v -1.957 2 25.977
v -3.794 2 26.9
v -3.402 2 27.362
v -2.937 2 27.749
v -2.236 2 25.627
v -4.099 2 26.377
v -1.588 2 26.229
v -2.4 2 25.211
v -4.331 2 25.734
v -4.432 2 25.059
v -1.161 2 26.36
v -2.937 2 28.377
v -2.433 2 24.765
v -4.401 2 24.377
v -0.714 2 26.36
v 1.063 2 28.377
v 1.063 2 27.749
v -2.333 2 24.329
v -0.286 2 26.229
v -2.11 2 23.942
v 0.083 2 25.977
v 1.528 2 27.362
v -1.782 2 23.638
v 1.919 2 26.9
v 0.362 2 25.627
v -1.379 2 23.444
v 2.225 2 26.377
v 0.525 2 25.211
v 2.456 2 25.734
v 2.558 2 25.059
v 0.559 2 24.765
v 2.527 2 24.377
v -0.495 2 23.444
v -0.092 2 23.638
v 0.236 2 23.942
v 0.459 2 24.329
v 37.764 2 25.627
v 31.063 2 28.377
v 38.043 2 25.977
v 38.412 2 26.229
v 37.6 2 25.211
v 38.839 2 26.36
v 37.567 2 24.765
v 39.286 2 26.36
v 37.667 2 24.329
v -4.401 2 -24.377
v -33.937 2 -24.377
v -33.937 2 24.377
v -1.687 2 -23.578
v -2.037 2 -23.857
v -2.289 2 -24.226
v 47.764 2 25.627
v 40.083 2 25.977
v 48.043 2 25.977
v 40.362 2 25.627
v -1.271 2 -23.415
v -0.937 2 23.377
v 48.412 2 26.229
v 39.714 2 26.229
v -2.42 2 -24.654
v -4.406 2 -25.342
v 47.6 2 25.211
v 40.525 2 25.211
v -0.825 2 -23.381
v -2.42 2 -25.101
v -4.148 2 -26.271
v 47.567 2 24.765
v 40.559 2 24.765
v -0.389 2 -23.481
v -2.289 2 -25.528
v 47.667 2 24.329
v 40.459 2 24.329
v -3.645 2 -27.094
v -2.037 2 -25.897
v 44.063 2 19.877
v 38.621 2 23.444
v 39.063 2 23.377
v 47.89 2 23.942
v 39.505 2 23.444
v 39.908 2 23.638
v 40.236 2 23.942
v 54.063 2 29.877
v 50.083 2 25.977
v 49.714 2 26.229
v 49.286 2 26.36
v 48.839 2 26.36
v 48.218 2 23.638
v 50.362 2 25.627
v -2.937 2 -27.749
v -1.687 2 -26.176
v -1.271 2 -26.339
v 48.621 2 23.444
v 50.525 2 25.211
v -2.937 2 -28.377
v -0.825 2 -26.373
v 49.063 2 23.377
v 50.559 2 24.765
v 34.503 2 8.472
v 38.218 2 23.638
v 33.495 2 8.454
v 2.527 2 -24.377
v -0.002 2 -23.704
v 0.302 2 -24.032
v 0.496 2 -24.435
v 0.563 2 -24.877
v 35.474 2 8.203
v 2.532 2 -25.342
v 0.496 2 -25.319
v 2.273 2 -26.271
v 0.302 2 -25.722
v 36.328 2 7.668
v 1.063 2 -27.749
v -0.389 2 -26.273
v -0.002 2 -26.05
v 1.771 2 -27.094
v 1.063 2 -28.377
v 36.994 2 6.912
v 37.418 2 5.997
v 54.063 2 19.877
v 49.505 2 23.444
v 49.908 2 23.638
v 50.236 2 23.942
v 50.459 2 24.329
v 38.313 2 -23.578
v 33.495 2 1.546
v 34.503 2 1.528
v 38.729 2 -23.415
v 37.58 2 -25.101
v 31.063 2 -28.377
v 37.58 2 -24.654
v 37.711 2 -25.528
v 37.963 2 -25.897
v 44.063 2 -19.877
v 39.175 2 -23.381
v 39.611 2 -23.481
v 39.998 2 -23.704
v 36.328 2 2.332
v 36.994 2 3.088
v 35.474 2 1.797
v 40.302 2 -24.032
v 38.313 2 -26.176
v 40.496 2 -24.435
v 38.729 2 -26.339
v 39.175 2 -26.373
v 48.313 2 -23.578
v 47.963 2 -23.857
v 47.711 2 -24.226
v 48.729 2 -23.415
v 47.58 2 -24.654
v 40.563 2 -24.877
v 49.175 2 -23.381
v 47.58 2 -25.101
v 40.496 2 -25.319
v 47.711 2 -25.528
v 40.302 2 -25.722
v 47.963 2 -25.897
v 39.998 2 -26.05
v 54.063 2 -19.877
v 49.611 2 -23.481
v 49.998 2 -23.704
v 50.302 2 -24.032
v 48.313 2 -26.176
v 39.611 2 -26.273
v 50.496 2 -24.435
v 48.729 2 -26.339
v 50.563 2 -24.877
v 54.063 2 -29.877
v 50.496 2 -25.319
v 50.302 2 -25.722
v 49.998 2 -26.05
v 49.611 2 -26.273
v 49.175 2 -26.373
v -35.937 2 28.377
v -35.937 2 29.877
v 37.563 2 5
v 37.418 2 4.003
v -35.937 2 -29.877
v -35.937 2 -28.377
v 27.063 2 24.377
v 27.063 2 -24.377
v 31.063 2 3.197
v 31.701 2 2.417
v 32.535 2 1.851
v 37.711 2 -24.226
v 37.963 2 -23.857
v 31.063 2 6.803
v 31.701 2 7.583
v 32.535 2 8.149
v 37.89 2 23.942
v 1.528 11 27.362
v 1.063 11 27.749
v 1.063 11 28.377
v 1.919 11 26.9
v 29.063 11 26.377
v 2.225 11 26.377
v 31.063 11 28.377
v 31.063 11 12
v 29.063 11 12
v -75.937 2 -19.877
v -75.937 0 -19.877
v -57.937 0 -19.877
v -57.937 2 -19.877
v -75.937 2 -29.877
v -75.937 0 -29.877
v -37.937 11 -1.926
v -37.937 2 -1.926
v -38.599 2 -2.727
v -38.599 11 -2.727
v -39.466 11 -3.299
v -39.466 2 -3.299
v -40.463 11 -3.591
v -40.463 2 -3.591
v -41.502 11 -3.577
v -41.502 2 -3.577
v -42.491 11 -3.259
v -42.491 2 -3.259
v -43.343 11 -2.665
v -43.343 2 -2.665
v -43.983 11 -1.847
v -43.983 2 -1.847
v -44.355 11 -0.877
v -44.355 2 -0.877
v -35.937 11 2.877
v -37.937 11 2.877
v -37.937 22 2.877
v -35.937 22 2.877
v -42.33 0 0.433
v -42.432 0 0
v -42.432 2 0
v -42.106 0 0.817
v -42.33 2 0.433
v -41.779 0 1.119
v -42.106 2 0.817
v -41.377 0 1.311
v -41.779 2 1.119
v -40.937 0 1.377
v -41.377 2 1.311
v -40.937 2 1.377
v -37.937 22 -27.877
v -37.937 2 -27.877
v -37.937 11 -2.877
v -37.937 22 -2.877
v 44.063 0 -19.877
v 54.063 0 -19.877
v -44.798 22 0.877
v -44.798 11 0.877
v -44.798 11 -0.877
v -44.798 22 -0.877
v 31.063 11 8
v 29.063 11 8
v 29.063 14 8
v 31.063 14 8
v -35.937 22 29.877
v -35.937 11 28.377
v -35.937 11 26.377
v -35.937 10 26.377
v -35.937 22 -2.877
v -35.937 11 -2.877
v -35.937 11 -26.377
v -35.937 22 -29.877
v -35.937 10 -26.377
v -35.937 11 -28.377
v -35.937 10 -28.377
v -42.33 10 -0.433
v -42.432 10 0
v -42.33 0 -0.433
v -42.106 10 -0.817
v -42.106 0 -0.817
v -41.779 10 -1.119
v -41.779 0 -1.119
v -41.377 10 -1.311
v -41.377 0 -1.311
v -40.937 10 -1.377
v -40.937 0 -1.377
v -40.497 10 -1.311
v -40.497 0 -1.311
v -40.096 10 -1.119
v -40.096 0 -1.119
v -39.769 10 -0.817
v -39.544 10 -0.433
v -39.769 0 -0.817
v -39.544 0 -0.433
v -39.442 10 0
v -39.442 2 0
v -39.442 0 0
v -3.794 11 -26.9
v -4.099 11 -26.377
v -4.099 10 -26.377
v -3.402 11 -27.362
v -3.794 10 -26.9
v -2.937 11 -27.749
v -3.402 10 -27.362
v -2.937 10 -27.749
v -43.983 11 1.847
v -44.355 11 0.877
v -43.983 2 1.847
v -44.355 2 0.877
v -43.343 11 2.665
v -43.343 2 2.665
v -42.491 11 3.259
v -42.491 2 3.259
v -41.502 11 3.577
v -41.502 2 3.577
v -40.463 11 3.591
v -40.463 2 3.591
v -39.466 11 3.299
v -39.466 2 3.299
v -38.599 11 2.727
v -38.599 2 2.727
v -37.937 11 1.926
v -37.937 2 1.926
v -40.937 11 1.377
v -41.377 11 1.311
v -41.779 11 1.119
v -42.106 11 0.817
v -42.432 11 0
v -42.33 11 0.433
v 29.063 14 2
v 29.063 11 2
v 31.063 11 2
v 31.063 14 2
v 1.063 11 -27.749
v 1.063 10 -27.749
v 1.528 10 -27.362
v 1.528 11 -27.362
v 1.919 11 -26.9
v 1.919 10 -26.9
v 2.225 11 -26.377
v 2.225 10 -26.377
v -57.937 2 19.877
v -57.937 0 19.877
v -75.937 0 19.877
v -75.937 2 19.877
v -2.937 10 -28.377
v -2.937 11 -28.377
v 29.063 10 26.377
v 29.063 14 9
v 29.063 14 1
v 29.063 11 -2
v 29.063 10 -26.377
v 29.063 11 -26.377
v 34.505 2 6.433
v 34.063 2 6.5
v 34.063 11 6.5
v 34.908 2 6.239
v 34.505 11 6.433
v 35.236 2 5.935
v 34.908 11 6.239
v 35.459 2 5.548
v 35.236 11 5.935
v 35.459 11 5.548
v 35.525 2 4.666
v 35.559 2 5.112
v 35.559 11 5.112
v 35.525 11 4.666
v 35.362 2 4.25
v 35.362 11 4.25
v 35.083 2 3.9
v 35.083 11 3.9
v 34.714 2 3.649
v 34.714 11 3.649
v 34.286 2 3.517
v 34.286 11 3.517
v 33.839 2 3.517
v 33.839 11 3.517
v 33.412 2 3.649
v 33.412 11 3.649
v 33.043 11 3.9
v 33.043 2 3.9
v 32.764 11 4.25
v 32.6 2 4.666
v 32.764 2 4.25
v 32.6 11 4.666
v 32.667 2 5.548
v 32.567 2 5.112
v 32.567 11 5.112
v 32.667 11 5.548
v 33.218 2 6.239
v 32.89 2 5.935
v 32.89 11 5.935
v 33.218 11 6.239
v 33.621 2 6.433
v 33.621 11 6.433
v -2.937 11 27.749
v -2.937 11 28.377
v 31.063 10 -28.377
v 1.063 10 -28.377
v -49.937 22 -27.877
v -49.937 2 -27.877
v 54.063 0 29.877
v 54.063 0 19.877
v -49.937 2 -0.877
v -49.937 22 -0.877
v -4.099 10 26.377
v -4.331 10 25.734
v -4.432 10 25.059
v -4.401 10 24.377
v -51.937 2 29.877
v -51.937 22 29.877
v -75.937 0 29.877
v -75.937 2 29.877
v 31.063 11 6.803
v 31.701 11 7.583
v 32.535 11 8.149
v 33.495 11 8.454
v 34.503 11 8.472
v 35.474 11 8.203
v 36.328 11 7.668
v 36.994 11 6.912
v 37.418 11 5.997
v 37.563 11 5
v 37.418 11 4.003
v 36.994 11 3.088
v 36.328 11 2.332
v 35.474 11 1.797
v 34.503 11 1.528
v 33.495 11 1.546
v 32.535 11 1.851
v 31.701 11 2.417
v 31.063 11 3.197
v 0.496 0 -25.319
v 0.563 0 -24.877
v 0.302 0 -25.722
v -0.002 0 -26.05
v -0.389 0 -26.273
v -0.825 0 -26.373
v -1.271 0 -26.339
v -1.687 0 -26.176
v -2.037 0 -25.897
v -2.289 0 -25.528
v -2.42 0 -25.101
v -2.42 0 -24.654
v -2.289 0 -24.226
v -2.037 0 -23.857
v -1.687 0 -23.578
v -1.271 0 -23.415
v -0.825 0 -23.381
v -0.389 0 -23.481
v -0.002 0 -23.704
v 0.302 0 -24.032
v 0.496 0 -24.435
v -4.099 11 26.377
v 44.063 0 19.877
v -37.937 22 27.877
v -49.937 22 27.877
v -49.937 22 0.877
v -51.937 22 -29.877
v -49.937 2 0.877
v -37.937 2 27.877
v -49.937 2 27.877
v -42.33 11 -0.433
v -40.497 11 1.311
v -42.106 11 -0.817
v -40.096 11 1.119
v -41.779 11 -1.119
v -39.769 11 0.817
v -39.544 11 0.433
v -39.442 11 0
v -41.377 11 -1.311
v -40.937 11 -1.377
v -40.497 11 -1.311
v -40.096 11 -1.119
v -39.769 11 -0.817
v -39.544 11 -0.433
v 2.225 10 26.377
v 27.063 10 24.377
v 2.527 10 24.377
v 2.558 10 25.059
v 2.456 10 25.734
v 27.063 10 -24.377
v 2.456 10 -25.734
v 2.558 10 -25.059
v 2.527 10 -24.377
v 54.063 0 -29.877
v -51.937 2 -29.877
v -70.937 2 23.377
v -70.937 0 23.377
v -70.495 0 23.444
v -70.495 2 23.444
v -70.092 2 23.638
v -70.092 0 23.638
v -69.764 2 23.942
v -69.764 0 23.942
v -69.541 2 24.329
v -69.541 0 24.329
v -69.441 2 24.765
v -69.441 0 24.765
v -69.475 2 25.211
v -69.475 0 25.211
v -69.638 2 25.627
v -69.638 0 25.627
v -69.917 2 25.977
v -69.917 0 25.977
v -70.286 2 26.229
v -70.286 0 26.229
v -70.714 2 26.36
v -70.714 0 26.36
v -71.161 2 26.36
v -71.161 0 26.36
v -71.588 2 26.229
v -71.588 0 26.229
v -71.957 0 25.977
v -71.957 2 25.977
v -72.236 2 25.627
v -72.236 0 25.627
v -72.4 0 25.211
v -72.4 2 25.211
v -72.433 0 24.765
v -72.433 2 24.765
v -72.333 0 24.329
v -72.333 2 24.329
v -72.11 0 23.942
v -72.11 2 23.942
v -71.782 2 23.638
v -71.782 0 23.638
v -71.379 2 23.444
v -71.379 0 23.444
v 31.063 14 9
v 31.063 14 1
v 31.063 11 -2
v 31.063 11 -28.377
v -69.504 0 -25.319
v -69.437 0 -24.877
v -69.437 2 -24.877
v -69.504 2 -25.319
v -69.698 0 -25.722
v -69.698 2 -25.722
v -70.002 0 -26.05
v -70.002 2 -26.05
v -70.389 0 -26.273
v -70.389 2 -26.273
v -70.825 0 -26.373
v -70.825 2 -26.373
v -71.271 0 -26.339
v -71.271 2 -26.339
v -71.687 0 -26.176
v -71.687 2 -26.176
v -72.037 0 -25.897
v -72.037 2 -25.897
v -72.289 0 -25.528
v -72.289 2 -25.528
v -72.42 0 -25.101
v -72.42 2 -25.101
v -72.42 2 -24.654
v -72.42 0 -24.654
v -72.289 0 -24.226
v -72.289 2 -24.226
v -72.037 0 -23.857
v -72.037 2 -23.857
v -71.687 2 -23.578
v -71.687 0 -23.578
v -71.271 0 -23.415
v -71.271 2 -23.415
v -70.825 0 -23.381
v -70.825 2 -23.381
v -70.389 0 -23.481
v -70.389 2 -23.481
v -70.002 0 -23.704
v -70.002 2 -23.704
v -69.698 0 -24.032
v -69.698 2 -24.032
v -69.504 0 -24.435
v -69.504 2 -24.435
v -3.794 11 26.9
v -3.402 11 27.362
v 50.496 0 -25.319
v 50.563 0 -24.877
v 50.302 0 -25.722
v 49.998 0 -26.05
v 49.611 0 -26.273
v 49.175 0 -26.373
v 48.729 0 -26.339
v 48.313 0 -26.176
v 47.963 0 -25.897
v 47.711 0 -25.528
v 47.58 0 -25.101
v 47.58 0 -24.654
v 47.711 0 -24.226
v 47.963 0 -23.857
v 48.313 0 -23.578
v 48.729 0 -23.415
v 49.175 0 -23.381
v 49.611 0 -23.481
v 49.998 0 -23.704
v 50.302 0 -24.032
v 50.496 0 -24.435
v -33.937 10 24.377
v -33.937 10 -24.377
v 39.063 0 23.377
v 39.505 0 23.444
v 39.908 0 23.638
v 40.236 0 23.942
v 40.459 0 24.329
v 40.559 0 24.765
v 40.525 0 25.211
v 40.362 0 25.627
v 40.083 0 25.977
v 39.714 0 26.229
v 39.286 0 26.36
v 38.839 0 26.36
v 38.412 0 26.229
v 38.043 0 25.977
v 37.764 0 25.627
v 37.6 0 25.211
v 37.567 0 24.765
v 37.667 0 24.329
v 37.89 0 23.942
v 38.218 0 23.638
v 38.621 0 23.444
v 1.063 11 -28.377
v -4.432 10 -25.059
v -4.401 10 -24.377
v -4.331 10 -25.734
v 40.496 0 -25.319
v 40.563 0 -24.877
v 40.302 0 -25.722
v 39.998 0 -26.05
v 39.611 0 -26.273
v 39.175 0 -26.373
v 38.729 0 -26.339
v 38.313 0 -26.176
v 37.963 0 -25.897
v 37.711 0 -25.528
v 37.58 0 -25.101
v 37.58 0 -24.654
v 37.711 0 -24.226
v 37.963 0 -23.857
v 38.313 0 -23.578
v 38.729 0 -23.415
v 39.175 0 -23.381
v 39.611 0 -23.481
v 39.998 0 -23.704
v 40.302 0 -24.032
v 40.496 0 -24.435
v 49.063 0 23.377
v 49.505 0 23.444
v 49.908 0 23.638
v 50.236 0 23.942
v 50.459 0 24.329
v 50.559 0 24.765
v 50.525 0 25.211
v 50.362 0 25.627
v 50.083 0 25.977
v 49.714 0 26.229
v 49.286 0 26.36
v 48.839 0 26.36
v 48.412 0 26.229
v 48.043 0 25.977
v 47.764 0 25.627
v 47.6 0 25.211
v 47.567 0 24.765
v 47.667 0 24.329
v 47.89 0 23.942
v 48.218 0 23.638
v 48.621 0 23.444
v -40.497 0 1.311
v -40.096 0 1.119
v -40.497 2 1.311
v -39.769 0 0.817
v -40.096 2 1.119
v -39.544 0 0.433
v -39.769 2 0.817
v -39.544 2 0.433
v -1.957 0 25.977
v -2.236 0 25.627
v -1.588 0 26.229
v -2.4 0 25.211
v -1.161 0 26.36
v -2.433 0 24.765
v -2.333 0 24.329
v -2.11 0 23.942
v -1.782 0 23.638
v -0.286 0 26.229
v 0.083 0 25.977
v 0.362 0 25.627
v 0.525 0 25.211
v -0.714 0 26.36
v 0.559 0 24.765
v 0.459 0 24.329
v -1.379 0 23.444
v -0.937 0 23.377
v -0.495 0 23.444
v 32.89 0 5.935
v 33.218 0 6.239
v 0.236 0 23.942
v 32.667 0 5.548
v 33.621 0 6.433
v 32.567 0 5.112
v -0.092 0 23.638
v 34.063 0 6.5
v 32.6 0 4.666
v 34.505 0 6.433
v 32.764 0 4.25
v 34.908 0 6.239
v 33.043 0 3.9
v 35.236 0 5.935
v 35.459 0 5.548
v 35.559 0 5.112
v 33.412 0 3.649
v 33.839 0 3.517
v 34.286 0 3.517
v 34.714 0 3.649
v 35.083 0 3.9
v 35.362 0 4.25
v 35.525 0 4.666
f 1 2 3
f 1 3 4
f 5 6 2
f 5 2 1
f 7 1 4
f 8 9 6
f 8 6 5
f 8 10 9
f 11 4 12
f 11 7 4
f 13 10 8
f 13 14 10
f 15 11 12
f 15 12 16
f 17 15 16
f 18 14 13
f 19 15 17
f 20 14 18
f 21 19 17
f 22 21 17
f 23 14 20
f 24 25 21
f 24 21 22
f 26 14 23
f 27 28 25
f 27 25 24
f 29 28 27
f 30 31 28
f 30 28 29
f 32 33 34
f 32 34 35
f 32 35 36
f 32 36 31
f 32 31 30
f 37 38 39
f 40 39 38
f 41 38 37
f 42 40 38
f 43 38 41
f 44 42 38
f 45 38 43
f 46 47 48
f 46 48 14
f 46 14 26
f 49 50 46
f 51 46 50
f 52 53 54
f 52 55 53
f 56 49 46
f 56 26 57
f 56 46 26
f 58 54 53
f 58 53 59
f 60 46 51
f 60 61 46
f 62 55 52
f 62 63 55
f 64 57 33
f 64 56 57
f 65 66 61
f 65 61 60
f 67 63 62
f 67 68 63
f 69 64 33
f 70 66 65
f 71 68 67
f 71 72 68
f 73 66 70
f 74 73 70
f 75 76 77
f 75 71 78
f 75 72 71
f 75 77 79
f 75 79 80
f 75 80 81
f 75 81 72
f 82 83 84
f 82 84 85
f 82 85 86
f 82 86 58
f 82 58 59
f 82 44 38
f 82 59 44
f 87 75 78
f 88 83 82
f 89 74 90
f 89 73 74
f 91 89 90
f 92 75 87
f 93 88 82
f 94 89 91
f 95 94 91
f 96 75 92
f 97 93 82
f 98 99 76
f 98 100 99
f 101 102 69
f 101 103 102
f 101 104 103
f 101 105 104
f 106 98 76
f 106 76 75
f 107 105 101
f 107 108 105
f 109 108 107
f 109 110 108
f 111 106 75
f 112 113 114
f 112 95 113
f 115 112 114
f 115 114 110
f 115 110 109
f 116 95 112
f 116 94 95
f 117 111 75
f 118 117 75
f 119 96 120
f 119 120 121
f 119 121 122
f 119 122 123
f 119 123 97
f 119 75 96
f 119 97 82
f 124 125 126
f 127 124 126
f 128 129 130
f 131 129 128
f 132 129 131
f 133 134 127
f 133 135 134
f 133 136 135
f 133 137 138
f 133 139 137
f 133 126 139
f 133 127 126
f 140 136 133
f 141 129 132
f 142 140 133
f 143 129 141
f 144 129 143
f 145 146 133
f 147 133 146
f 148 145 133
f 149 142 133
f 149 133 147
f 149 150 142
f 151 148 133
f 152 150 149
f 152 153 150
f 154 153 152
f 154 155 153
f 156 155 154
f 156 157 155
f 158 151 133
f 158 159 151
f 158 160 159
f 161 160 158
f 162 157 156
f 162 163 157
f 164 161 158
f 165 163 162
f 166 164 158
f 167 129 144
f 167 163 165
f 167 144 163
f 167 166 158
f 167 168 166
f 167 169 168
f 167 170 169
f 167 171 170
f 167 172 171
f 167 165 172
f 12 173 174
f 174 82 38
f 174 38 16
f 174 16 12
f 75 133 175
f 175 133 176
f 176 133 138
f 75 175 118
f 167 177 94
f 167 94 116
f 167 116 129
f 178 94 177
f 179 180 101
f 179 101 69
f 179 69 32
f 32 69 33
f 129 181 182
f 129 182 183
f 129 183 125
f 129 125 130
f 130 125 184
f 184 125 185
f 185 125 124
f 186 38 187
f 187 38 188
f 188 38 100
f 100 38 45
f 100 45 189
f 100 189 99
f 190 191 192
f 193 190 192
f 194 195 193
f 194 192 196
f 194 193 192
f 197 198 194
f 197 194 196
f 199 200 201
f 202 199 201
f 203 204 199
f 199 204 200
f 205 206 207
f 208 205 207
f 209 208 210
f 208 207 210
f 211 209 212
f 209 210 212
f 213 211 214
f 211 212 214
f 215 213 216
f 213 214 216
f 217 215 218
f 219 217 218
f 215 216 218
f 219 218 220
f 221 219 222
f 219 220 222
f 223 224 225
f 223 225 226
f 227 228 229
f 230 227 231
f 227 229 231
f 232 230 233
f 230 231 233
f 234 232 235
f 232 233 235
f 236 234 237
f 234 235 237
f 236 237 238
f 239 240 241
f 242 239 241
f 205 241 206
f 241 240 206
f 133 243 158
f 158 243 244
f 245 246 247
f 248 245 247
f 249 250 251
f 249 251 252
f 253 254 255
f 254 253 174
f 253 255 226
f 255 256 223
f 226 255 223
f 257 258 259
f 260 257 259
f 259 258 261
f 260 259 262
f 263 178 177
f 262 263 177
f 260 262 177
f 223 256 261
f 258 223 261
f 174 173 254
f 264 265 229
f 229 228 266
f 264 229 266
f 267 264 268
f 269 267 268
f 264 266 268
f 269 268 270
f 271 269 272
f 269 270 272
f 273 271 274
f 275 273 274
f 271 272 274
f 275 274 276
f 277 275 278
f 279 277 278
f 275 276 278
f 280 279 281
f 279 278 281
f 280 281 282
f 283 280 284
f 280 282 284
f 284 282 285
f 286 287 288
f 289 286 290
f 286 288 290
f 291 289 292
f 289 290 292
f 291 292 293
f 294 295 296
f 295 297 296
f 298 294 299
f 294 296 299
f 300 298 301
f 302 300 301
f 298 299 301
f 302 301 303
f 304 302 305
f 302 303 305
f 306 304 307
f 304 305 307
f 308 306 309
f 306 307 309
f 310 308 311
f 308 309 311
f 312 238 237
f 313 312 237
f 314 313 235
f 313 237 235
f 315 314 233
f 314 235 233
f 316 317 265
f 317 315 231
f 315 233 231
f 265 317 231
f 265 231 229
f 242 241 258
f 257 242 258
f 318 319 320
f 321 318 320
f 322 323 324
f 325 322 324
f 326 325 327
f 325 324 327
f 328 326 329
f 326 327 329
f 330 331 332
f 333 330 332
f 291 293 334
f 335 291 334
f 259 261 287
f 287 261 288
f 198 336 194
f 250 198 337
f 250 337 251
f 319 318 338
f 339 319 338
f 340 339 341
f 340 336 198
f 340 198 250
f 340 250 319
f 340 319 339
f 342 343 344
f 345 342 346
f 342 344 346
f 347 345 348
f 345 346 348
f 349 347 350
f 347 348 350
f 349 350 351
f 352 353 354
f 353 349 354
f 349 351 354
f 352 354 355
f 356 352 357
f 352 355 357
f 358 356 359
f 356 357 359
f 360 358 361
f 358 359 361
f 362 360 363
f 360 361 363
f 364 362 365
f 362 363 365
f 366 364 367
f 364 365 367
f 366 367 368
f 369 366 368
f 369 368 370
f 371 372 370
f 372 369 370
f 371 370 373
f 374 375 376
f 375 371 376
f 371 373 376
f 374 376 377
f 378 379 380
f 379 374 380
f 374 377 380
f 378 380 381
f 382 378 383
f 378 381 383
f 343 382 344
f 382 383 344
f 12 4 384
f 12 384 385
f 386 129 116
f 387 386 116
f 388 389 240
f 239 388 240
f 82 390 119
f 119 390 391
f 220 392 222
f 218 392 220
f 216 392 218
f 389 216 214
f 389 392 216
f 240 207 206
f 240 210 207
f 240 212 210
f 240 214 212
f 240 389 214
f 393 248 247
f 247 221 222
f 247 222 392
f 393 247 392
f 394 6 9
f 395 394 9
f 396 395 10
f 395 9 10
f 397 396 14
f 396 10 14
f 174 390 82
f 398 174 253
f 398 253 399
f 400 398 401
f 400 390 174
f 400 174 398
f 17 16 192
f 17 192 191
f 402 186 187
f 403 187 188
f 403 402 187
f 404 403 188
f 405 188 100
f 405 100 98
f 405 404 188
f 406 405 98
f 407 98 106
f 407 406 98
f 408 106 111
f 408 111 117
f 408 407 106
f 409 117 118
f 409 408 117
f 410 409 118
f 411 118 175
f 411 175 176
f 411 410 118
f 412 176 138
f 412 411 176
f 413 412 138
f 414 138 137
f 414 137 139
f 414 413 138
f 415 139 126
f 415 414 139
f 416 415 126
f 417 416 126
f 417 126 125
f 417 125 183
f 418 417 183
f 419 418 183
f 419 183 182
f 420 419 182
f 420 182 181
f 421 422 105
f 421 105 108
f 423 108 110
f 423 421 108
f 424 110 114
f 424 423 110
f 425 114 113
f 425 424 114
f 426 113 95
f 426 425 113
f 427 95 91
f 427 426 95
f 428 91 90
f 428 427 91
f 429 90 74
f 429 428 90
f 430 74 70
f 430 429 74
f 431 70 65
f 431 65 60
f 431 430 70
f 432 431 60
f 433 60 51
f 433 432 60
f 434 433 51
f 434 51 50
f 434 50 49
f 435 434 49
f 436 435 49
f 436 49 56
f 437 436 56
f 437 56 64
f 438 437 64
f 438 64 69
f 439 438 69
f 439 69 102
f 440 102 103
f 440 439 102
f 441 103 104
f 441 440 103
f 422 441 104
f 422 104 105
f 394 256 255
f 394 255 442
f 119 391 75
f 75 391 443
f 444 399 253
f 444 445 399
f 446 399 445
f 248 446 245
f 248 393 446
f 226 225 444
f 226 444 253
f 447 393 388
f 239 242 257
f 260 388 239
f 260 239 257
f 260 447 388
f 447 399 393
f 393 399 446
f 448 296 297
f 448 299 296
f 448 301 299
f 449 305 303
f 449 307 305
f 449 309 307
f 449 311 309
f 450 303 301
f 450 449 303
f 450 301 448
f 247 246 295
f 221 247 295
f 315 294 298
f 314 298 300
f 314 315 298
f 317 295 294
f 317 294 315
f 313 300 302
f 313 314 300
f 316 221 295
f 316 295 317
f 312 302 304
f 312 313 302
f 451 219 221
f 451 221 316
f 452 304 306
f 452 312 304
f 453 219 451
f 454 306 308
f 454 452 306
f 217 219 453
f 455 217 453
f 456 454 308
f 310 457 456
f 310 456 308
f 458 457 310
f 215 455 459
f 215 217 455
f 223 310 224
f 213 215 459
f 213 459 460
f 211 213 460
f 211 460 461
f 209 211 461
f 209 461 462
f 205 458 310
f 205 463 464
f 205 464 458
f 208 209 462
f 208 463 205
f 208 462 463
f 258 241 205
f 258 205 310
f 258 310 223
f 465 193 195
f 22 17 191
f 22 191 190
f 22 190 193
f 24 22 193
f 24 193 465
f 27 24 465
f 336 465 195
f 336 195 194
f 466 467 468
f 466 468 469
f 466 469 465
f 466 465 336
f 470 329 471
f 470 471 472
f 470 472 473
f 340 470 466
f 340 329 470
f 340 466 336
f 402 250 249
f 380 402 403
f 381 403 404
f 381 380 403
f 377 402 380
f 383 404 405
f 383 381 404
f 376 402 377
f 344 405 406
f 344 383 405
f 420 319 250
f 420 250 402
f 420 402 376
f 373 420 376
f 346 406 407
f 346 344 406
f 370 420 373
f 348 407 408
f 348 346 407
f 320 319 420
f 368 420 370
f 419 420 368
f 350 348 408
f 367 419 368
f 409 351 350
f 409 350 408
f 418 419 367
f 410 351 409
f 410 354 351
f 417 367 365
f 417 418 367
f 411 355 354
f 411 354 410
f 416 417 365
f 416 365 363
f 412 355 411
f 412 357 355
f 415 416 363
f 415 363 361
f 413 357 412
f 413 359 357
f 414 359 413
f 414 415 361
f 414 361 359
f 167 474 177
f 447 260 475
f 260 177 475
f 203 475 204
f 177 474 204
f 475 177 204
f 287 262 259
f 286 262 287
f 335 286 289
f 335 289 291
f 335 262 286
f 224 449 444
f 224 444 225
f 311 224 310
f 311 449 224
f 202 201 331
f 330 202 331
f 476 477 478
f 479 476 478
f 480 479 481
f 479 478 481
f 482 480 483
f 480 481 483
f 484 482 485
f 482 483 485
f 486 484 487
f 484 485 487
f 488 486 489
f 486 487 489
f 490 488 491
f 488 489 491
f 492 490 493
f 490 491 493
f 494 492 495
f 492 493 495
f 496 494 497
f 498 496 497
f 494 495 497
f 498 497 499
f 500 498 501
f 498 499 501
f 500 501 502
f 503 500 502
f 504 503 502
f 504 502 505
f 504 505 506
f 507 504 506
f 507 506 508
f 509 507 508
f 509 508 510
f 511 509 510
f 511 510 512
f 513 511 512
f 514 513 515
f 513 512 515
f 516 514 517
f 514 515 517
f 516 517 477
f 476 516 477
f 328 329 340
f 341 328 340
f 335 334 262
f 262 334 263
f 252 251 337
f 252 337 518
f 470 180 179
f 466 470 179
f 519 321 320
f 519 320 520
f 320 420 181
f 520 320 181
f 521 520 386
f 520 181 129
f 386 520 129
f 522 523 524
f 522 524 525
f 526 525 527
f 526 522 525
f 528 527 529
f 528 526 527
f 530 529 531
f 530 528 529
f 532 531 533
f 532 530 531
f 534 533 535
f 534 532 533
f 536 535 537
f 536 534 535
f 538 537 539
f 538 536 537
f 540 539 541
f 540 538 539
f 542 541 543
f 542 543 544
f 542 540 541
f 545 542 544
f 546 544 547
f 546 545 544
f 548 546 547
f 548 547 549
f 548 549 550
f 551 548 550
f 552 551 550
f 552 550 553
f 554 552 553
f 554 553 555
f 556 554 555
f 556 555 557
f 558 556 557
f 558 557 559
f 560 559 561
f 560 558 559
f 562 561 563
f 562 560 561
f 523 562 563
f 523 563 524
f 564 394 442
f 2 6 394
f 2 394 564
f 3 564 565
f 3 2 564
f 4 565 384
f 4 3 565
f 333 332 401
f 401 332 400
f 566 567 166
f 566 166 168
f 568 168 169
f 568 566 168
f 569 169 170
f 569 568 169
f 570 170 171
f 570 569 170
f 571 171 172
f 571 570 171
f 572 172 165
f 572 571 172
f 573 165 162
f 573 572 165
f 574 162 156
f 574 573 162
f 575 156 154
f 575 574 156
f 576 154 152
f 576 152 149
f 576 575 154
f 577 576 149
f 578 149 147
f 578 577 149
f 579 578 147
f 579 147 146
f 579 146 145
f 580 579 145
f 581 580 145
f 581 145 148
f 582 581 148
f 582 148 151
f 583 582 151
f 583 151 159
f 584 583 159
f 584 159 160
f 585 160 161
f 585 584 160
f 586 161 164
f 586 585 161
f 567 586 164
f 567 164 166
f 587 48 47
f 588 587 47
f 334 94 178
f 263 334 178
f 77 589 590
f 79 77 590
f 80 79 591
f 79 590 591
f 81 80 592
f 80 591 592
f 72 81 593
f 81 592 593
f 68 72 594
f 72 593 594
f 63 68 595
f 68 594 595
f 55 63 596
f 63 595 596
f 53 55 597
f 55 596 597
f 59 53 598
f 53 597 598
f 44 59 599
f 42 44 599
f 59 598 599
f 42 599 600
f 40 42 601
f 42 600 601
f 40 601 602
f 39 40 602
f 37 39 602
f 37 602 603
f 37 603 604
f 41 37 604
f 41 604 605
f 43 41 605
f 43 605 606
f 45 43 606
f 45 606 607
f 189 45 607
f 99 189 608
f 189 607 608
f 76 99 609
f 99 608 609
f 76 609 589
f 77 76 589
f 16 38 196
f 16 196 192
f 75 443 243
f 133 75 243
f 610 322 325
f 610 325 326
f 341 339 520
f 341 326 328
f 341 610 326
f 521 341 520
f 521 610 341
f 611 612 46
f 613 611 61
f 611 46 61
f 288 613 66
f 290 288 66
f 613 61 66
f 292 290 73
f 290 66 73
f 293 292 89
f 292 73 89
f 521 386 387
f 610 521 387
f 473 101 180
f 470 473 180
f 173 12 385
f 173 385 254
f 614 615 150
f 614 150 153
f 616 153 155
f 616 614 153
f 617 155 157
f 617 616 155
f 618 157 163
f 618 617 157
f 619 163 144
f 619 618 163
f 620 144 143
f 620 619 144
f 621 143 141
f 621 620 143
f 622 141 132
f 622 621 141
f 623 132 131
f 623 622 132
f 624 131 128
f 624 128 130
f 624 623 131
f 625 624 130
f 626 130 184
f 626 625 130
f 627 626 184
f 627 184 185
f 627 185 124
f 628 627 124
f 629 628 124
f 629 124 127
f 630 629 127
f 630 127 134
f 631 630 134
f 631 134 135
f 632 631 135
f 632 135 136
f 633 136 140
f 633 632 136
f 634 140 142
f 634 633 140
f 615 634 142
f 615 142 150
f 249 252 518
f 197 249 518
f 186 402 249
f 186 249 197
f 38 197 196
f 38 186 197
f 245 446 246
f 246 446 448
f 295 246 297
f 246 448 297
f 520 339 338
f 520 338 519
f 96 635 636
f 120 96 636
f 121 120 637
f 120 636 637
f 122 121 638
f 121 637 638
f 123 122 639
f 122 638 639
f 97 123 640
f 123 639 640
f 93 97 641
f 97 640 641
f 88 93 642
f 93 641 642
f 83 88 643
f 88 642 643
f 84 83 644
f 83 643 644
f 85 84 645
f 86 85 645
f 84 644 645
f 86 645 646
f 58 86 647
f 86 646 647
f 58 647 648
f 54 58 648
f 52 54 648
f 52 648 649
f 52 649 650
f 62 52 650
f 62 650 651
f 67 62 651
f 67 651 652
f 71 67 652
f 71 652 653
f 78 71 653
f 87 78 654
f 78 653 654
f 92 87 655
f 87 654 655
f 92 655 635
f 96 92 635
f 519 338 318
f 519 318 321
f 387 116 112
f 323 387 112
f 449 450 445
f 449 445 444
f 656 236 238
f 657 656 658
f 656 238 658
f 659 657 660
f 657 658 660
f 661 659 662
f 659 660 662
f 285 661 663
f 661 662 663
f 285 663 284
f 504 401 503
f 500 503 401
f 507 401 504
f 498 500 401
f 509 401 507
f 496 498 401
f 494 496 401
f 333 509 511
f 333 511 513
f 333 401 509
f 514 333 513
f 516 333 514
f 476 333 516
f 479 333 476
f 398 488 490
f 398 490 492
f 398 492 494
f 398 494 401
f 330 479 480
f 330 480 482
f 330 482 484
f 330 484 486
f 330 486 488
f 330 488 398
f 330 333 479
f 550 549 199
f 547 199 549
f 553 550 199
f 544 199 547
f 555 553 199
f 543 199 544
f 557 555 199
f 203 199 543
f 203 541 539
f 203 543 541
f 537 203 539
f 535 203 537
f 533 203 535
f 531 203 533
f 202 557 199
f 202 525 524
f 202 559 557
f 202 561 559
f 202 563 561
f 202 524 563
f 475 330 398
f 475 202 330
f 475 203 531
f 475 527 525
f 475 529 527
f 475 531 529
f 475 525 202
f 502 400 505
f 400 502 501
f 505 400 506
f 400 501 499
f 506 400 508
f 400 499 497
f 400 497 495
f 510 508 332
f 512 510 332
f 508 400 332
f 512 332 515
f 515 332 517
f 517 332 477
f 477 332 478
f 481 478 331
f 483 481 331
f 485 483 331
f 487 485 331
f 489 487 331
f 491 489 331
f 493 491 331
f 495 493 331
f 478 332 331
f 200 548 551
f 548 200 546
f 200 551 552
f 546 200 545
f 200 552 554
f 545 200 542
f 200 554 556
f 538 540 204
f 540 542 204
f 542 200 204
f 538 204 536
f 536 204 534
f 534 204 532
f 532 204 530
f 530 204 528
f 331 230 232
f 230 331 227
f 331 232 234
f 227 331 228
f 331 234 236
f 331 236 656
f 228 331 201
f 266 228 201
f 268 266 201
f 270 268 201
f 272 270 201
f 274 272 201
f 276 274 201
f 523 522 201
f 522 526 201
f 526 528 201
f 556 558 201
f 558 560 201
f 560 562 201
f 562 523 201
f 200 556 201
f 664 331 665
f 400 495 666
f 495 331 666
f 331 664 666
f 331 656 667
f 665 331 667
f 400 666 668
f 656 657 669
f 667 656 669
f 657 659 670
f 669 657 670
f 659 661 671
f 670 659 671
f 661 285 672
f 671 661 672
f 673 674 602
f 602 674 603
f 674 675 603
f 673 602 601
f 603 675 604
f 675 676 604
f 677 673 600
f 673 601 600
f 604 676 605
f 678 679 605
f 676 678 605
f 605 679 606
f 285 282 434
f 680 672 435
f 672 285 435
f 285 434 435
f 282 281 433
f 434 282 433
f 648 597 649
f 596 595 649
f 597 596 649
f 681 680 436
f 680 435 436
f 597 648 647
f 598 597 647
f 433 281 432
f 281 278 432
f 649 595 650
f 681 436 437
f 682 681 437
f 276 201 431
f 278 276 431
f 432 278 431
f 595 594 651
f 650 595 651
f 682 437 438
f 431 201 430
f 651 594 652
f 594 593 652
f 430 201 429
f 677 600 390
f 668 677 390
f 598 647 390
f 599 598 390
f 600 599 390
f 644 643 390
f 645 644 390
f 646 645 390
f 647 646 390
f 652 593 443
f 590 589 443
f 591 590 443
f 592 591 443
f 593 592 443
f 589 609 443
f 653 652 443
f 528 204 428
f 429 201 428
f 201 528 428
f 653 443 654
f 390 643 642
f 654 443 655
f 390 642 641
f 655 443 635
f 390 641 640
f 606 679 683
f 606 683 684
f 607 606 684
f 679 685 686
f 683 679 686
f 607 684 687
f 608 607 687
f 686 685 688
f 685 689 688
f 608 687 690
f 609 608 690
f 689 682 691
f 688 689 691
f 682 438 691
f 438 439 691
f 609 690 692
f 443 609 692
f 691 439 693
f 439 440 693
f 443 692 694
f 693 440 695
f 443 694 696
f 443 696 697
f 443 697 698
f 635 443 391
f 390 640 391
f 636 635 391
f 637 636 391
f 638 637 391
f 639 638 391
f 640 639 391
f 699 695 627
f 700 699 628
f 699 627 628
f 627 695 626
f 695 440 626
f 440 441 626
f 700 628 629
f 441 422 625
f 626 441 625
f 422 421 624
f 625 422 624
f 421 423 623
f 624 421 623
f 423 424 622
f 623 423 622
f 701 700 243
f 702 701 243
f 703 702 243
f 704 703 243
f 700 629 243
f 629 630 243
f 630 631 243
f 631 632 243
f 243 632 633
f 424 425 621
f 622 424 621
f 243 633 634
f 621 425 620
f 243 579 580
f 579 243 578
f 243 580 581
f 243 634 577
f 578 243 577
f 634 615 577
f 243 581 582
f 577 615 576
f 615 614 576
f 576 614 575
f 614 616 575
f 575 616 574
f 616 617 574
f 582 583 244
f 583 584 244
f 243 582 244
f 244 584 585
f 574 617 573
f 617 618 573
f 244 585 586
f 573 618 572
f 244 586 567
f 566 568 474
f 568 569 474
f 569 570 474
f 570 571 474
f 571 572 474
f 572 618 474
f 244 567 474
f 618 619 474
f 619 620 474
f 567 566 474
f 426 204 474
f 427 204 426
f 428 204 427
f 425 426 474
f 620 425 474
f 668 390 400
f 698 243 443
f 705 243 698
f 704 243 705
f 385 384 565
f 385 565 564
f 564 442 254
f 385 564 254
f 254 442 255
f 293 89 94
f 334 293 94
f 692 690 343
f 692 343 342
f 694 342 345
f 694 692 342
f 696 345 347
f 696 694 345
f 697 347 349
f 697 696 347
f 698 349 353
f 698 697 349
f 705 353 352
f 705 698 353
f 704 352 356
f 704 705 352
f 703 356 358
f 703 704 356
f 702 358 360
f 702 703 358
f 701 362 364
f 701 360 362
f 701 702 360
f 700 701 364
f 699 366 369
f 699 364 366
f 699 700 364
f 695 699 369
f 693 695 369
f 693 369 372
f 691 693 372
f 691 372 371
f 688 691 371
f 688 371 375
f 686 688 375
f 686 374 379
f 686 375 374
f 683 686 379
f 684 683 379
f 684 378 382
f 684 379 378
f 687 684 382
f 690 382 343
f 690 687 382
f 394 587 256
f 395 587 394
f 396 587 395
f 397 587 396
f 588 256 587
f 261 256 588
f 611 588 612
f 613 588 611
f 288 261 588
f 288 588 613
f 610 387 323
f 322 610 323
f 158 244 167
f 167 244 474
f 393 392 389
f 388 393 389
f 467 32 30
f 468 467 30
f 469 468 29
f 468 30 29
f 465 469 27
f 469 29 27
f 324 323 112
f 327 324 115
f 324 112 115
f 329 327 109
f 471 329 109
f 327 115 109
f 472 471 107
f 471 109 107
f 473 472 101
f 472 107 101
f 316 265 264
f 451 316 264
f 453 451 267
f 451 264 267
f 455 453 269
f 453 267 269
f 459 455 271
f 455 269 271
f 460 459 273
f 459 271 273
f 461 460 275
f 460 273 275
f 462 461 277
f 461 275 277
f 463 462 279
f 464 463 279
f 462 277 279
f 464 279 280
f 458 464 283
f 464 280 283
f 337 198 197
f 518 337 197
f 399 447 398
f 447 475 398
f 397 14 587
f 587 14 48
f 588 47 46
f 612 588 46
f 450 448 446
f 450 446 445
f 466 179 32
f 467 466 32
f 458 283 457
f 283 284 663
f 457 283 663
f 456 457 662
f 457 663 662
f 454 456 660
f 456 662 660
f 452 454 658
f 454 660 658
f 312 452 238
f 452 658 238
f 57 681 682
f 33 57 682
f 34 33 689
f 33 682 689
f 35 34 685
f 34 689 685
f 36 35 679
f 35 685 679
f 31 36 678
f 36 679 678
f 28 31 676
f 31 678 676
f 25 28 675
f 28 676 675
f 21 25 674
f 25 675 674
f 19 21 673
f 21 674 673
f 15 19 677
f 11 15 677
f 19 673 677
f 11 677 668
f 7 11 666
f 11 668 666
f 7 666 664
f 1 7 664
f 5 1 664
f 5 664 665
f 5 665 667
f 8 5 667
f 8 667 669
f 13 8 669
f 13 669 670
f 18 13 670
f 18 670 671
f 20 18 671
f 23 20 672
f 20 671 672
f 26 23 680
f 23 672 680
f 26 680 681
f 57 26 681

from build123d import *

# Parameters (mm, degrees)
SZKIC1_W                        = 10
SZKIC1_H                        = 10
DODANIE_WYCI_GNI_CIE1_DEPTH     = 2
SZKIC3_R                        = 1.5
DODANIE_WYCI_GNI_CIE2_DEPTH     = 2
DODANIE_WYCI_GNI_CIE11_DEPTH    = 8
DODANIE_WYCI_GNI_CIE12_DEPTH    = 20
DODANIE_WYCI_GNI_CIE13_DEPTH    = 9
SZKIC7_R                        = 1.5
WYTNIJ_WYCI_GNI_CIE1_DEPTH      = 85.018427919
DODANIE_WYCI_GNI_CIE15_DEPTH    = 9
SZKIC9_W                        = 2
SZKIC9_H                        = 25.25
SZKIC9_W_2                      = 5.139687394
SZKIC9_H_2                      = 1
DODANIE_WYCI_GNI_CIE16_DEPTH    = 11
SZKIC10_R                       = 1.5
WYTNIJ_WYCI_GNI_CIE2_DEPTH      = 85.51683992
LUSTRO4_OUTLINE_R               = 1.5
LUSTRO4_DEPTH                   = 2
LUSTRO4_START                   = 2
LUSTRO4_2_DEPTH                 = 8
LUSTRO4_START_2                 = 10
LUSTRO4_3_DEPTH                 = 12
LUSTRO4_4_DEPTH                 = 1
WYTNIJ_WYCI_GNI_CIE3_DEPTH      = 85.018427919
WYTNIJ_WYCI_GNI_CIE3_DEPTH_BACK = 85.018427919
SZKIC11_R                       = 1.5
DODANIE_WYCI_GNI_CIE17_START    = 9
SZKIC12_R                       = 3.5
SZKIC12_R_2                     = 1.5
DODANIE_WYCI_GNI_CIE17_DEPTH    = 9
SZKIC13_W                       = 2
SZKIC13_H                       = 4
DODANIE_WYCI_GNI_CIE18_DEPTH    = 3
SFAZOWANIE2_SIZE                = 3


# Read off the part's stored shape, not the designer's step: Lustro4
with BuildPart() as part:
    # Szkic1 → Dodanie-wyciągnięcie1 (new body)
    with BuildSketch(Plane(origin=(0, 0, 0), x_dir=(1, 0, 0), z_dir=(0, 1, 0))):
        with Locations((-5, -5)):
            Rectangle(SZKIC1_W, SZKIC1_H)
    extrude(amount=DODANIE_WYCI_GNI_CIE1_DEPTH)



with BuildPart() as body_2:
    # Szkic3 → Dodanie-wyciągnięcie2 (new body)
    with BuildSketch(Plane.XZ):
        Polygon((-75.937188702, 29.877074857), (44.062811298, 29.877074857), (54.062811298, 29.877074857), (54.062811298, 19.877074857), (44.062811298, 19.877074857), (44.062811298, -0.122925143), (-57.937188702, -0.122925143), (-57.937188702, 19.877074857), (-75.937188702, 19.877074857), align=None)
        with Locations(Location((-70.937188702, 24.877074857, 0), (0, 0, 270))):
            Circle(SZKIC3_R, mode=Mode.SUBTRACT)
        with Locations(Location((39.062811298, 24.877074857, 0), (0, 0, 270))):
            Circle(SZKIC3_R, mode=Mode.SUBTRACT)
        with Locations(Location((-0.937188702, 24.877074857, 0), (0, 0, 270))):
            Circle(SZKIC3_R, mode=Mode.SUBTRACT)
        with Locations(Location((49.062811298, 24.877074857, 0), (0, 0, 270))):
            Circle(SZKIC3_R, mode=Mode.SUBTRACT)
    extrude(amount=-DODANIE_WYCI_GNI_CIE2_DEPTH)

    # Szkic4 → Dodanie-wyciągnięcie11 (add)
    with BuildSketch(Plane(origin=(0, 2, 0), x_dir=(1, 0, 0), z_dir=(0, 1, 0))):
        with BuildLine():
            Line((29.062811298, 0.122925143), (27.062811298, 0.122925143))
            Line((27.062811298, 0.122925143), (27.062811298, -24.377074857))
            Line((27.062811298, -24.377074857), (4.540036873, -24.377074857))
            Line((4.540036873, -24.377074857), (2.526912913, -24.377074857))
            ThreePointArc((2.526912913, -24.377074857), (2.523624146, -25.399352968), (2.225088958, -26.377074857))
            Line((2.225088958, -26.377074857), (4.35431392, -26.377074857))
            Line((4.35431392, -26.377074857), (29.062811298, -26.377074857))
            Line((29.062811298, -26.377074857), (29.062811298, 0.122925143))
        make_face()
        with BuildLine():
            Line((-35.937188702, 0.122925143), (-35.937188702, -26.377074857))
            Line((-35.937188702, -26.377074857), (-6.228691325, -26.377074857))
            Line((-6.228691325, -26.377074857), (-4.099466363, -26.377074857))
            ThreePointArc((-4.099466363, -26.377074857), (-4.398001551, -25.399352968), (-4.401290318, -24.377074857))
            Line((-4.401290318, -24.377074857), (-6.414414278, -24.377074857))
            Line((-6.414414278, -24.377074857), (-33.937188702, -24.377074857))
            Line((-33.937188702, -24.377074857), (-33.937188702, 0.122925143))
            Line((-33.937188702, 0.122925143), (-35.937188702, 0.122925143))
        make_face()
    extrude(amount=DODANIE_WYCI_GNI_CIE11_DEPTH)

    # Szkic5 → Dodanie-wyciągnięcie12 (add)
    with BuildSketch(Plane(origin=(0, 2, 0), x_dir=(1, 0, 0), z_dir=(0, 1, 0))):
        Polygon((-51.937188702, 0.122925143), (-49.937188702, 0.122925143), (-49.937188702, -27.877074857), (-35.937188702, -27.877074857), (-35.937188702, -29.877074857), (-51.937188702, -29.877074857), align=None)
    extrude(amount=DODANIE_WYCI_GNI_CIE12_DEPTH)

    # Szkic6 → Dodanie-wyciągnięcie13 (add)
    with BuildSketch(Plane(origin=(0, 2, 0), x_dir=(1, 0, 0), z_dir=(0, 1, 0))):
        with BuildLine():
            Line((-37.937188702, 0.122925143), (-35.937188702, 0.122925143))
            Line((-35.937188702, 0.122925143), (-35.937188702, -26.377074857))
            Line((-35.937188702, -26.377074857), (-4.099466363, -26.377074857))
            ThreePointArc((-4.099466363, -26.377074857), (-3.607968863, -27.139138811), (-2.937188702, -27.74935618))
            Line((-2.937188702, -27.74935618), (-2.937188702, -28.377074857))
            Line((-2.937188702, -28.377074857), (-4.507902917, -28.377074857))
            Line((-4.507902917, -28.377074857), (-37.937188702, -28.377074857))
            Line((-37.937188702, -28.377074857), (-37.937188702, 0.122925143))
        make_face()
        with BuildLine():
            Line((31.062811298, 0.122925143), (31.062811298, -28.377074857))
            Line((31.062811298, -28.377074857), (2.633525512, -28.377074857))
            Line((2.633525512, -28.377074857), (1.062811298, -28.377074857))
            Line((1.062811298, -28.377074857), (1.062811298, -27.74935618))
            ThreePointArc((1.062811298, -27.74935618), (1.733591458, -27.139138811), (2.225088958, -26.377074857))
            Line((2.225088958, -26.377074857), (29.062811298, -26.377074857))
            Line((29.062811298, -26.377074857), (29.062811298, 0.122925143))
            Line((29.062811298, 0.122925143), (31.062811298, 0.122925143))
        make_face()
    extrude(amount=DODANIE_WYCI_GNI_CIE13_DEPTH)

    # Szkic7 → Wytnij-wyciągnięcie1 (cut, symmetric)
    with BuildSketch(Plane(origin=(0, 2, 0), x_dir=(1, 0, 0), z_dir=(0, 1, 0))):
        with Locations((-40.937188702, 0.122925143)):
            Circle(SZKIC7_R)
    extrude(amount=WYTNIJ_WYCI_GNI_CIE1_DEPTH, both=True, mode=Mode.SUBTRACT)

    # Szkic8 → Dodanie-wyciągnięcie15 (add)
    with BuildSketch(Plane(origin=(0, 2, 0), x_dir=(1, 0, 0), z_dir=(0, 1, 0))):
        with BuildLine():
            Line((-37.937188702, 0.122925143), (-37.437188702, 0.122925143))
            ThreePointArc((-37.437188702, 0.122925143), (-40.937188702, 3.622925143), (-44.437188702, 0.122925143))
            Line((-44.437188702, 0.122925143), (-49.937188702, 0.122925143))
            Line((-49.937188702, 0.122925143), (-49.937188702, -0.877074857))
            Line((-49.937188702, -0.877074857), (-44.291290669, -0.877074857))
            ThreePointArc((-44.291290669, -0.877074857), (-40.937188702, -3.377074857), (-37.583086736, -0.877074857))
            Line((-37.583086736, -0.877074857), (-37.937188702, -0.877074857))
            Line((-37.937188702, -0.877074857), (-37.937188702, 0.122925143))
        make_face()
    extrude(amount=DODANIE_WYCI_GNI_CIE15_DEPTH)

    # Szkic9 → Dodanie-wyciągnięcie16 (add)
    with BuildSketch(Plane(origin=(0, 11, 0), x_dir=(1, 0, 0), z_dir=(0, 1, 0))):
        with Locations((-36.937188702, -15.502074857)):
            Rectangle(SZKIC9_W, SZKIC9_H)
        with Locations((-47.367345005, -0.377074857)):
            Rectangle(SZKIC9_W_2, SZKIC9_H_2)
    extrude(amount=DODANIE_WYCI_GNI_CIE16_DEPTH)

    # Szkic10 → Wytnij-wyciągnięcie2 (cut, through all)
    with BuildSketch(Plane.XZ):
        with Locations(Location((-40.937188702, -0.122925143, 0), (0, 0, 90))):
            Circle(SZKIC10_R)
    extrude(amount=-WYTNIJ_WYCI_GNI_CIE2_DEPTH, mode=Mode.SUBTRACT)


with BuildPart() as part_1:
    add(part.part)

    add(body_2.part)  # Lustro4 merges body 2
    # Lustro4 outline → Lustro4 (add)
    with BuildSketch(Plane(origin=(0, 0, 0), x_dir=(1, 0, 0), z_dir=(0, 1, 0))):
        with BuildLine():
            Line((-39.437188702, 0.122925143), (44.062811298, 0.122925143))
            Line((44.062811298, 0.122925143), (44.062811298, 19.877074857))
            Line((44.062811298, 19.877074857), (54.062811298, 19.877074857))
            Line((54.062811298, 19.877074857), (54.062811298, 29.877074857))
            Line((54.062811298, 29.877074857), (-75.937188702, 29.877074857))
            Line((-75.937188702, 29.877074857), (-75.937188702, 19.877074857))
            Line((-75.937188702, 19.877074857), (-57.937188702, 19.877074857))
            Line((-57.937188702, 19.877074857), (-57.937188702, 0.122925143))
            Line((-57.937188702, 0.122925143), (-42.437188702, 0.122925143))
            ThreePointArc((-42.437188702, 0.122925143), (-42.435926834, 0.061410823), (-42.432143353, 0))
            ThreePointArc((-42.432143353, 0), (-40.937188702, 1.377074857), (-39.442234051, 0))
            ThreePointArc((-39.442234051, 0), (-39.43845057, 0.061410823), (-39.437188702, 0.122925143))
        make_face()
        with Locations((49.062811298, 24.877074857)):
            Circle(LUSTRO4_OUTLINE_R, mode=Mode.SUBTRACT)
        with Locations((-0.937188702, 24.877074857)):
            Circle(LUSTRO4_OUTLINE_R, mode=Mode.SUBTRACT)
        with Locations((39.062811298, 24.877074857)):
            Circle(LUSTRO4_OUTLINE_R, mode=Mode.SUBTRACT)
        with Locations((-70.937188702, 24.877074857)):
            Circle(LUSTRO4_OUTLINE_R, mode=Mode.SUBTRACT)
    extrude(amount=LUSTRO4_DEPTH)

    # Lustro4 2 outline → Lustro4 2 (add)
    with BuildSketch(Plane(origin=(0, 0, 0), x_dir=(1, 0, 0), z_dir=(0, 1, 0)).offset(LUSTRO4_START)):
        with BuildLine():
            ThreePointArc((-37.937188702, 1.925700781), (-37.564504311, 1.05833949), (-37.437188702, 0.122925143))
            Line((-37.437188702, 0.122925143), (-33.937188702, 0.122925143))
            Line((-33.937188702, 0.122925143), (-33.937188702, 24.377074857))
            Line((-33.937188702, 24.377074857), (-4.401290318, 24.377074857))
            ThreePointArc((-4.401290318, 24.377074857), (-4.147667163, 26.270928527), (-2.937188702, 27.74935618))
            Line((-2.937188702, 27.74935618), (-2.937188702, 28.377074857))
            Line((-2.937188702, 28.377074857), (-35.937188702, 28.377074857))
            Line((-35.937188702, 28.377074857), (-35.937188702, 29.877074857))
            Line((-35.937188702, 29.877074857), (-51.937188702, 29.877074857))
            Line((-51.937188702, 29.877074857), (-51.937188702, 0.122925143))
            Line((-51.937188702, 0.122925143), (-44.437188702, 0.122925143))
            ThreePointArc((-44.437188702, 0.122925143), (-44.416574388, 0.502234055), (-44.354974273, 0.877074857))
            Line((-44.354974273, 0.877074857), (-49.937188702, 0.877074857))
            Line((-49.937188702, 0.877074857), (-49.937188702, 27.877074857))
            Line((-49.937188702, 27.877074857), (-37.937188702, 27.877074857))
            Line((-37.937188702, 27.877074857), (-37.937188702, 1.925700781))
        make_face()
        with BuildLine():
            Line((-44.291290669, -0.877074857), (-44.354974274, -0.877074857))
            ThreePointArc((-44.354974274, -0.877074857), (-41.501582428, -3.577119654), (-37.937188702, -1.925700781))
            Line((-37.937188702, -1.925700781), (-37.937188702, -1.679850495))
            ThreePointArc((-37.937188702, -1.679850495), (-41.37589046, -3.349471834), (-44.291290669, -0.877074857))
        make_face()
        with BuildLine():
            ThreePointArc((-39.442234051, 0), (-40.937188702, 1.622925143), (-42.432143353, 0))
            ThreePointArc((-42.432143353, 0), (-40.937188702, 1.377074857), (-39.442234051, 0))
        make_face()
        with BuildLine():
            Line((27.062811298, 24.377074857), (27.062811298, 0.122925143))
            Line((27.062811298, 0.122925143), (31.062811298, 0.122925143))
            Line((31.062811298, 0.122925143), (31.062811298, 28.377074857))
            Line((31.062811298, 28.377074857), (1.062811298, 28.377074857))
            Line((1.062811298, 28.377074857), (1.062811298, 27.74935618))
            ThreePointArc((1.062811298, 27.74935618), (2.273289758, 26.270928527), (2.526912913, 24.377074857))
            Line((2.526912913, 24.377074857), (27.062811298, 24.377074857))
        make_face()
    extrude(amount=LUSTRO4_2_DEPTH)

    # Lustro4 3 outline → Lustro4 3 (add)
    with BuildSketch(Plane(origin=(0, 0, 0), x_dir=(1, 0, 0), z_dir=(0, 1, 0)).offset(LUSTRO4_START_2)):
        Polygon((-37.937188702, 27.877074857), (-37.937188702, 2.877074857), (-35.937188702, 2.877074857), (-35.937188702, 29.877074857), (-51.937188702, 29.877074857), (-51.937188702, 0.122925143), (-44.797501308, 0.122925143), (-44.797501308, 0.877074857), (-49.937188702, 0.877074857), (-49.937188702, 27.877074857), align=None)
    extrude(amount=LUSTRO4_3_DEPTH)

    # Lustro4 4 outline → Lustro4 4 (add)
    with BuildSketch(Plane(origin=(0, 0, 0), x_dir=(1, 0, 0), z_dir=(0, 1, 0)).offset(LUSTRO4_START_2)):
        with BuildLine():
            Line((-37.937188702, 2.877074857), (-37.937188702, 1.925700781))
            ThreePointArc((-37.937188702, 1.925700781), (-37.564504311, 1.05833949), (-37.437188702, 0.122925143))
            Line((-37.437188702, 0.122925143), (-35.937188702, 0.122925143))
            Line((-35.937188702, 0.122925143), (-35.937188702, 2.877074857))
            Line((-35.937188702, 2.877074857), (-37.937188702, 2.877074857))
        make_face()
        with BuildLine():
            ThreePointArc((-44.437188702, 0.122925143), (-44.416574388, 0.502234055), (-44.354974273, 0.877074857))
            Line((-44.354974273, 0.877074857), (-44.797501308, 0.877074857))
            Line((-44.797501308, 0.877074857), (-44.797501308, 0.122925143))
            Line((-44.797501308, 0.122925143), (-44.437188702, 0.122925143))
        make_face()
        with BuildLine():
            Line((-44.291290669, -0.877074857), (-44.354974274, -0.877074857))
            ThreePointArc((-44.354974274, -0.877074857), (-41.501582428, -3.577119654), (-37.937188702, -1.925700781))
            Line((-37.937188702, -1.925700781), (-37.937188702, -1.679850495))
            ThreePointArc((-37.937188702, -1.679850495), (-41.37589046, -3.349471834), (-44.291290669, -0.877074857))
        make_face()
        with BuildLine():
            ThreePointArc((-39.442234051, 0), (-40.937188702, 1.622925143), (-42.432143353, 0))
            ThreePointArc((-42.432143353, 0), (-40.937188702, 1.377074857), (-39.442234051, 0))
        make_face()
        with BuildLine():
            Line((-35.937188702, 28.377074857), (-35.937188702, 26.377074857))
            Line((-35.937188702, 26.377074857), (-4.099466363, 26.377074857))
            ThreePointArc((-4.099466363, 26.377074857), (-3.607968863, 27.139138811), (-2.937188702, 27.74935618))
            Line((-2.937188702, 27.74935618), (-2.937188702, 28.377074857))
            Line((-2.937188702, 28.377074857), (-35.937188702, 28.377074857))
        make_face()
        with BuildLine():
            Line((29.062811298, 26.377074857), (29.062811298, 0.122925143))
            Line((29.062811298, 0.122925143), (31.062811298, 0.122925143))
            Line((31.062811298, 0.122925143), (31.062811298, 28.377074857))
            Line((31.062811298, 28.377074857), (1.062811298, 28.377074857))
            Line((1.062811298, 28.377074857), (1.062811298, 27.74935618))
            ThreePointArc((1.062811298, 27.74935618), (1.733591458, 27.139138811), (2.225088958, 26.377074857))
            Line((2.225088958, 26.377074857), (29.062811298, 26.377074857))
        make_face()
    extrude(amount=LUSTRO4_4_DEPTH)

    # Szkic11 → Wytnij-wyciągnięcie3 (cut, two sides: drawn at the far end of the back side and taken through both)
    with BuildSketch(Plane(origin=(0, 2, 0), x_dir=(1, 0, 0), z_dir=(0, 1, 0)).offset(-WYTNIJ_WYCI_GNI_CIE3_DEPTH_BACK)):
        with Locations(Location((34.062811298, -5, 0), (0, 0, 270))):
            Circle(SZKIC11_R)
    extrude(amount=WYTNIJ_WYCI_GNI_CIE3_DEPTH + WYTNIJ_WYCI_GNI_CIE3_DEPTH_BACK, mode=Mode.SUBTRACT)

    # Szkic12 → Dodanie-wyciągnięcie17 (add)
    with BuildSketch(Plane(origin=(0, 2, 0), x_dir=(1, 0, 0), z_dir=(0, 1, 0)).offset(DODANIE_WYCI_GNI_CIE17_START)):
        with Locations((34.062811298, -5)):
            Circle(SZKIC12_R)
        with Locations(Location((34.062811298, -5, 0), (0, 0, 270))):
            Circle(SZKIC12_R_2, mode=Mode.SUBTRACT)
    extrude(amount=-DODANIE_WYCI_GNI_CIE17_DEPTH)

    # Szkic13 → Dodanie-wyciągnięcie18 (add)
    with BuildSketch(Plane(origin=(0, 11, 0), x_dir=(1, 0, 0), z_dir=(0, 1, 0))):
        with Locations((30.062811298, 0)):
            Rectangle(SZKIC13_W, SZKIC13_H)
        with Locations((30.062811298, -10)):
            Rectangle(SZKIC13_W, SZKIC13_H)
    extrude(amount=DODANIE_WYCI_GNI_CIE18_DEPTH)

    # Sfazowanie2
    sfazowanie2_edges = [part_1.edges().sort_by_distance(p)[0] for p in [
        (30.062811298, 14, 12),
        (30.062811298, 14, -2),
    ]]
    chamfer(sfazowanie2_edges, length=SFAZOWANIE2_SIZE - 0.0001)  # a hair under: the kernel refuses the full size


solid = part_1.part
